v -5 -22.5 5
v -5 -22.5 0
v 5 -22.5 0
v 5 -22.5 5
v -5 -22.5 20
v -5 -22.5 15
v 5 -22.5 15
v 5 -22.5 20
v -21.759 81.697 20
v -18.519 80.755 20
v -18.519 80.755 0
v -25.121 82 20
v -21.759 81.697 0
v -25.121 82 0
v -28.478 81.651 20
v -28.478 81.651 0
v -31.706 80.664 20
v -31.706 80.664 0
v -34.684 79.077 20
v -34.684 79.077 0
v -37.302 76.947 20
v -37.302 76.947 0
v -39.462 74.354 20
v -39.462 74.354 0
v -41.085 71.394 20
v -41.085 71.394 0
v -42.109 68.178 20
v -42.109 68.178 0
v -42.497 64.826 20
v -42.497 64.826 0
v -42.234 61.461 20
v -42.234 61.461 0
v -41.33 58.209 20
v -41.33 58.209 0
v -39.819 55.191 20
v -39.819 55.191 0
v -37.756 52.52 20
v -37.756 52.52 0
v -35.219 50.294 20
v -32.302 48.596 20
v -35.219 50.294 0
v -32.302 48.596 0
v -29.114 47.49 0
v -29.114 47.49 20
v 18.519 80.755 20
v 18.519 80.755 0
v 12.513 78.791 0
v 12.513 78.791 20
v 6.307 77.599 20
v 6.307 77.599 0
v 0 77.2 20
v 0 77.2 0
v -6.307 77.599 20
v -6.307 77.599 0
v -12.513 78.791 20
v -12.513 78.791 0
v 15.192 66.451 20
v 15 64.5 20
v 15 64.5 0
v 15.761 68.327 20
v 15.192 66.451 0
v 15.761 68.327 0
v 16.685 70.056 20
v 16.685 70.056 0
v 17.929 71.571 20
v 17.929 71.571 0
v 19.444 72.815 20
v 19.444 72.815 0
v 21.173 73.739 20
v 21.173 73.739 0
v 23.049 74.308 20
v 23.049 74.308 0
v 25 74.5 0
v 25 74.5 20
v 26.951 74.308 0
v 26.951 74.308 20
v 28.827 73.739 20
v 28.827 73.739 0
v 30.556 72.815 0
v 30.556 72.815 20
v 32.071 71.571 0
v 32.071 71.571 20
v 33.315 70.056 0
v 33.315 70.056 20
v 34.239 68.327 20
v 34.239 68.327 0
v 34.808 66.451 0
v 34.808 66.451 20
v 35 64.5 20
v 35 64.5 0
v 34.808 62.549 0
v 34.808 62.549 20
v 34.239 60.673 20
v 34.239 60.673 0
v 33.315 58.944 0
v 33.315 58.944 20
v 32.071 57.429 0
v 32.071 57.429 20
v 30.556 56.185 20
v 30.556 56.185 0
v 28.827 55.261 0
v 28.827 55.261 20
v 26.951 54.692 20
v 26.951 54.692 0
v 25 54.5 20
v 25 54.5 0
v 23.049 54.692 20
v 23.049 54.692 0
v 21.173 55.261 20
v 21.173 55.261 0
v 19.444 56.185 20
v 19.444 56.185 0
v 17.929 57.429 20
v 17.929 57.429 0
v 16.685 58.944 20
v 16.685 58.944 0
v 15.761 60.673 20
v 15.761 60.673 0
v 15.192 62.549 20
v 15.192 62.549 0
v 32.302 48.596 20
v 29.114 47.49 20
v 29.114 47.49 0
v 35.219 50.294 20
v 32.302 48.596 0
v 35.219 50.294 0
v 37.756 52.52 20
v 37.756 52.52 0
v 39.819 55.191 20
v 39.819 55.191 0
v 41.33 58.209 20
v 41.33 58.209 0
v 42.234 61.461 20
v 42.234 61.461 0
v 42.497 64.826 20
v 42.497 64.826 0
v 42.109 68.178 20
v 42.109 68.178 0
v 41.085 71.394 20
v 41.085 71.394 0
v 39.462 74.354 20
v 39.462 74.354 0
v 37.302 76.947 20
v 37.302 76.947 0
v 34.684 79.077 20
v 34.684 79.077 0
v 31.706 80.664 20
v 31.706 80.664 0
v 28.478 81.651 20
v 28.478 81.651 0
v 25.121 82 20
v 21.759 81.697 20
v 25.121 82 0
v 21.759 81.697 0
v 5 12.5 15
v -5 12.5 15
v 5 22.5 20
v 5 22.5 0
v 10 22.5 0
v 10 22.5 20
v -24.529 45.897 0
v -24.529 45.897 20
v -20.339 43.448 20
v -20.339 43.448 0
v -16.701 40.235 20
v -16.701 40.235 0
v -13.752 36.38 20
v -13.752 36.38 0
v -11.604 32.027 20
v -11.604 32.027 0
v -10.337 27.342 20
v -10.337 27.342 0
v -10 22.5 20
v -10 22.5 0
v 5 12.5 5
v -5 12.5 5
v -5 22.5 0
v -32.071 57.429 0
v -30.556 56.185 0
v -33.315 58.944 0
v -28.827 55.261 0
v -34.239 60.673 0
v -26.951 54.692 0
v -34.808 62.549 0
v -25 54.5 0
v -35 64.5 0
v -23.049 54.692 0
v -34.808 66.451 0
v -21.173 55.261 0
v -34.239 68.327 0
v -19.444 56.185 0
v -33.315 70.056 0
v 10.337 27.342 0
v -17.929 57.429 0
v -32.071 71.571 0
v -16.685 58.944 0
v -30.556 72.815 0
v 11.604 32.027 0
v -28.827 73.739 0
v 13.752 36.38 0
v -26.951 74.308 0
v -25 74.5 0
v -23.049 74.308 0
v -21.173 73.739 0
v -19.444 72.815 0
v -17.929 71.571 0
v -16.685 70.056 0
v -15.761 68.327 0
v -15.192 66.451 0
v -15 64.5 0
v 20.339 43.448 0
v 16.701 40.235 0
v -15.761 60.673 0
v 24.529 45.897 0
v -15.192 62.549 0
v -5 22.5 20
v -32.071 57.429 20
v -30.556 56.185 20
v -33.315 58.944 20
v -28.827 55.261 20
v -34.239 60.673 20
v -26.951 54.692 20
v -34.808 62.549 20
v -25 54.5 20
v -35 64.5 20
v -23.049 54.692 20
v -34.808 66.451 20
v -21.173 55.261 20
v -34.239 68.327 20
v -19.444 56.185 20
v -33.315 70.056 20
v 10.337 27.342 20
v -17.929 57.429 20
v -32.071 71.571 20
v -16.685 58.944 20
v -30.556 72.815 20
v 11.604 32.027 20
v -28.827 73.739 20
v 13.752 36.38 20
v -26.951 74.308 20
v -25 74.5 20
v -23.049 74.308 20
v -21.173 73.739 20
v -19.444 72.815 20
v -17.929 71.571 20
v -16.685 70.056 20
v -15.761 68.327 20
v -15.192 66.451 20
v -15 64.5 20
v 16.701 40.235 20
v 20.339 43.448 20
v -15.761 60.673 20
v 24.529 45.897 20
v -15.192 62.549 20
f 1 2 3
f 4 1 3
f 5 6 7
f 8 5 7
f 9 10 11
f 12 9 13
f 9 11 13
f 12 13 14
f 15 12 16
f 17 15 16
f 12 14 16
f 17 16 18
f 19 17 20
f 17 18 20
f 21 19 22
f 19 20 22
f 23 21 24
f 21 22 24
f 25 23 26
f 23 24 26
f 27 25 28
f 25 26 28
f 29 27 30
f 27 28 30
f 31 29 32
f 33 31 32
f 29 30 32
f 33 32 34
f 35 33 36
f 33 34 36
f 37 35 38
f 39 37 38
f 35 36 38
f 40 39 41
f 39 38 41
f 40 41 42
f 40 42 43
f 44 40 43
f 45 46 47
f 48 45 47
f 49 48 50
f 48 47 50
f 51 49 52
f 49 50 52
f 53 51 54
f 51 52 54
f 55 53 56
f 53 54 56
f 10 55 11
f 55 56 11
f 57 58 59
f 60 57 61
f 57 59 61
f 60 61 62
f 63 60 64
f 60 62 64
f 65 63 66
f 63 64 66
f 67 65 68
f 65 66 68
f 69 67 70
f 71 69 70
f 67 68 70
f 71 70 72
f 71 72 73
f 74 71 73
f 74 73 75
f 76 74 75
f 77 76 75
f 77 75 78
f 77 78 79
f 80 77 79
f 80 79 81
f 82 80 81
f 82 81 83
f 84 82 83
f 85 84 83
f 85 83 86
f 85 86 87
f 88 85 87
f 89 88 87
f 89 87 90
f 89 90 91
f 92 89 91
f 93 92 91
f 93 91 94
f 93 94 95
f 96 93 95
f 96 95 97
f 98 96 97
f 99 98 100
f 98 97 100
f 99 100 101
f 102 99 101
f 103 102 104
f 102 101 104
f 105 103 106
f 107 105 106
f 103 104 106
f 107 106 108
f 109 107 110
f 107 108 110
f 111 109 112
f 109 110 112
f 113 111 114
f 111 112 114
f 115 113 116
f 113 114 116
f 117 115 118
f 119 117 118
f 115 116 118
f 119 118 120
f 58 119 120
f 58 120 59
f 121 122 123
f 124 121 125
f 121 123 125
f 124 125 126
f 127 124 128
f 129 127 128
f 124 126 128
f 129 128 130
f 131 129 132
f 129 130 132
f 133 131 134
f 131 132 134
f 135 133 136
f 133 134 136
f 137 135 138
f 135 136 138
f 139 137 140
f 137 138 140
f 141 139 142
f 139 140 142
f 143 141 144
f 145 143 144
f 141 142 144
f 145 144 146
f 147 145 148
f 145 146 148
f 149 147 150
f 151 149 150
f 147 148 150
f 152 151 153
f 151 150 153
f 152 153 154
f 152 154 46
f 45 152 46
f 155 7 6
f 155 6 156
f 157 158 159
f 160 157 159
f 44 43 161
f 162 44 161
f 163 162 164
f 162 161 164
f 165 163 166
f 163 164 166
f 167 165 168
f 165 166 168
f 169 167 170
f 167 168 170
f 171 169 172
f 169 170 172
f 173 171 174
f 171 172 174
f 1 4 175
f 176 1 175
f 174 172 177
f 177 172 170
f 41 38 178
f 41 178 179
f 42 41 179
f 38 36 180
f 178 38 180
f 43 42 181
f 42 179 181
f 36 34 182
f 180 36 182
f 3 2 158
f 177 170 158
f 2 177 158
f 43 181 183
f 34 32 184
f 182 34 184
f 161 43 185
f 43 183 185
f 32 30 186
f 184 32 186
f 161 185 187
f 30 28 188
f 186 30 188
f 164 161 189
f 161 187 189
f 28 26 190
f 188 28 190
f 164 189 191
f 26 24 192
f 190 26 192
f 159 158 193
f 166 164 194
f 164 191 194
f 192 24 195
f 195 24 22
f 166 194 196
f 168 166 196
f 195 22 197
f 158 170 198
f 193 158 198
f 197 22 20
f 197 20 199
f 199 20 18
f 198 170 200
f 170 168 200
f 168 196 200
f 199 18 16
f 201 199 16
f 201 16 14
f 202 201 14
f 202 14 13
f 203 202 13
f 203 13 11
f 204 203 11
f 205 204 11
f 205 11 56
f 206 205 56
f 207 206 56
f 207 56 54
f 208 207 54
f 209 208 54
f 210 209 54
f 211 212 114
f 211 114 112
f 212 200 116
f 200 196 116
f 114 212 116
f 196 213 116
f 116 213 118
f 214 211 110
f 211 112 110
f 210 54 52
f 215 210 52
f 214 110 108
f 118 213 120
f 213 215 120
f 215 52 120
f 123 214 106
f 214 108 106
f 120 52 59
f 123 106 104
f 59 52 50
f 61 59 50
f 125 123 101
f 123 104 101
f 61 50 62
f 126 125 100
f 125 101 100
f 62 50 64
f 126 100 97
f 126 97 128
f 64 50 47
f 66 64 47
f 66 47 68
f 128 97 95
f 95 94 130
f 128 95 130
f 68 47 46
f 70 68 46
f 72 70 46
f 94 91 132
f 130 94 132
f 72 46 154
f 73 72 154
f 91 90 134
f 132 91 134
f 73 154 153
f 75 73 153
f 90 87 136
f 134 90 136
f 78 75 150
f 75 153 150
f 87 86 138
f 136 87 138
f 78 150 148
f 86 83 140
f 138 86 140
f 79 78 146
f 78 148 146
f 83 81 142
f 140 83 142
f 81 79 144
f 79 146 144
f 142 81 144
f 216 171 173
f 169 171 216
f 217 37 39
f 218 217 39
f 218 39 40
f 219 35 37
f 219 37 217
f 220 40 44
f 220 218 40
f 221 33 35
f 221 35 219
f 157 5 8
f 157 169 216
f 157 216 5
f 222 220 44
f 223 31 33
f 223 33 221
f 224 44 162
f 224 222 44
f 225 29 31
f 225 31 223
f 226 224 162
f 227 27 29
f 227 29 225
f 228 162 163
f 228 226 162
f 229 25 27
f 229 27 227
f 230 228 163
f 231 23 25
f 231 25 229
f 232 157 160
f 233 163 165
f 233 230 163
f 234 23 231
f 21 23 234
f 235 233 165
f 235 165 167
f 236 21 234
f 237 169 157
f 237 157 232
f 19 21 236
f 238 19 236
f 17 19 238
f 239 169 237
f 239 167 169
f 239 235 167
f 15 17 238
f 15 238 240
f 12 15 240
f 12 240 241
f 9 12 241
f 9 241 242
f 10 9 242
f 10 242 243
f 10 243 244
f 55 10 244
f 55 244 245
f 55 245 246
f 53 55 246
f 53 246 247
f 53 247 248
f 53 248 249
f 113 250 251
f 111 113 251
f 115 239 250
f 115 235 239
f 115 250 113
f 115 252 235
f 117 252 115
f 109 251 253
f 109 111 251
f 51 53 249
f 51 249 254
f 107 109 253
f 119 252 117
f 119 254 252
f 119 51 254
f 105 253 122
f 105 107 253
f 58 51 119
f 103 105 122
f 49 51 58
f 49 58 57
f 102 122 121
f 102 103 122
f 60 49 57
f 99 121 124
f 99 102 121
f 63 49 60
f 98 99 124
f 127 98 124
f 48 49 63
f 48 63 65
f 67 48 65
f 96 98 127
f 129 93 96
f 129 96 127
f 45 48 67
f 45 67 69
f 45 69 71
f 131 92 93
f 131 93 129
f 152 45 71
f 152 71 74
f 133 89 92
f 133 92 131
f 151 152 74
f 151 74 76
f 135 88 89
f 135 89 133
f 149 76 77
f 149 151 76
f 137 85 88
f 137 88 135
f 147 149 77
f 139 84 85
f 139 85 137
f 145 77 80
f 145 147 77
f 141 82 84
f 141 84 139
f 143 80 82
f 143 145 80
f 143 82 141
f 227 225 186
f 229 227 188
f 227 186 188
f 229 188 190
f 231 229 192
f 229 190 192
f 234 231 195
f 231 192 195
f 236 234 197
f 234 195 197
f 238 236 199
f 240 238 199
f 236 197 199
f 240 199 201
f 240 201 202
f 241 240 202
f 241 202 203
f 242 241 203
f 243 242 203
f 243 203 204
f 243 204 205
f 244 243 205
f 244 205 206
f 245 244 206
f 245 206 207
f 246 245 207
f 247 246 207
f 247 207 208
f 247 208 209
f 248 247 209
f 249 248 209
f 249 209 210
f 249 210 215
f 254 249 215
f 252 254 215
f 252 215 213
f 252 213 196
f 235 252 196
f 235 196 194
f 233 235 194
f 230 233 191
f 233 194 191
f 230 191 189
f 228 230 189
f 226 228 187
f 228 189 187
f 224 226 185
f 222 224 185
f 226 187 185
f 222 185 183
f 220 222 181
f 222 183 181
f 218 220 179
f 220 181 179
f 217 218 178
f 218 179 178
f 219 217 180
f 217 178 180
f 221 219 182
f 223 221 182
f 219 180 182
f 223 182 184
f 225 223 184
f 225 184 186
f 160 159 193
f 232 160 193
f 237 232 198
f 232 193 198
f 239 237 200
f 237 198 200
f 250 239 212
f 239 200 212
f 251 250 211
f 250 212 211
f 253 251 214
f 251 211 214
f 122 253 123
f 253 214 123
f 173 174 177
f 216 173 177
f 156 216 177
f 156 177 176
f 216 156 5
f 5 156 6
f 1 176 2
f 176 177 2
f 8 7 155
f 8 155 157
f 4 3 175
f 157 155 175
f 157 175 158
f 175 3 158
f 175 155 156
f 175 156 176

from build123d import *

# Parameters (mm, degrees)
BOSS_EXTRUDE1_DEPTH = 20
SKETCH3_W           = 10
SKETCH3_H           = 35
CUT_EXTRUDE1_DEPTH  = 48.5
SKETCH4_R           = 10
CUT_EXTRUDE2_DEPTH  = 21


with BuildPart() as part:
    # Sketch1 → Boss-Extrude1 (new body)
    with BuildSketch(Plane.XY):
        with BuildLine():
            Line((-5, -22.5), (5, -22.5))
            Line((5, -22.5), (5, 22.5))
            Line((5, 22.5), (10, 22.5))
            ThreePointArc((10, 22.5), (15.132819854, 38.37888203), (29.113715132, 47.490374848))
            ThreePointArc((29.113715132, 47.490374848), (41.674629404, 69.811001246), (18.518518519, 80.755472857))
            ThreePointArc((18.518518519, 80.755472857), (0, 77.19968102), (-18.518518519, 80.755472857))
            ThreePointArc((-18.518518519, 80.755472857), (-41.674629404, 69.811001246), (-29.113715132, 47.490374848))
            ThreePointArc((-29.113715132, 47.490374848), (-15.132819854, 38.37888203), (-10, 22.5))
            Line((-10, 22.5), (-5, 22.5))
            Line((-5, 22.5), (-5, -22.5))
        make_face()
    extrude(amount=BOSS_EXTRUDE1_DEPTH)

    # Sketch3 → Cut-Extrude1 (cut, through all)
    with BuildSketch(Plane(origin=(5, 0, 0), x_dir=(0, 0, -1), z_dir=(1, 0, 0))):
        with Locations((-10, -5)):
            Rectangle(SKETCH3_W, SKETCH3_H)
    extrude(amount=-CUT_EXTRUDE1_DEPTH, mode=Mode.SUBTRACT)

    # Sketch4 → Cut-Extrude2 (cut, through all)
    with BuildSketch(Plane(origin=(0, 0, 0), x_dir=(-1, 0, 0), z_dir=(0, 0, -1))):
        with Locations((-25, 64.5)):
            Circle(SKETCH4_R)
        with Locations((25, 64.5)):
            Circle(SKETCH4_R)
    extrude(amount=-CUT_EXTRUDE2_DEPTH, mode=Mode.SUBTRACT)


solid = part.part
